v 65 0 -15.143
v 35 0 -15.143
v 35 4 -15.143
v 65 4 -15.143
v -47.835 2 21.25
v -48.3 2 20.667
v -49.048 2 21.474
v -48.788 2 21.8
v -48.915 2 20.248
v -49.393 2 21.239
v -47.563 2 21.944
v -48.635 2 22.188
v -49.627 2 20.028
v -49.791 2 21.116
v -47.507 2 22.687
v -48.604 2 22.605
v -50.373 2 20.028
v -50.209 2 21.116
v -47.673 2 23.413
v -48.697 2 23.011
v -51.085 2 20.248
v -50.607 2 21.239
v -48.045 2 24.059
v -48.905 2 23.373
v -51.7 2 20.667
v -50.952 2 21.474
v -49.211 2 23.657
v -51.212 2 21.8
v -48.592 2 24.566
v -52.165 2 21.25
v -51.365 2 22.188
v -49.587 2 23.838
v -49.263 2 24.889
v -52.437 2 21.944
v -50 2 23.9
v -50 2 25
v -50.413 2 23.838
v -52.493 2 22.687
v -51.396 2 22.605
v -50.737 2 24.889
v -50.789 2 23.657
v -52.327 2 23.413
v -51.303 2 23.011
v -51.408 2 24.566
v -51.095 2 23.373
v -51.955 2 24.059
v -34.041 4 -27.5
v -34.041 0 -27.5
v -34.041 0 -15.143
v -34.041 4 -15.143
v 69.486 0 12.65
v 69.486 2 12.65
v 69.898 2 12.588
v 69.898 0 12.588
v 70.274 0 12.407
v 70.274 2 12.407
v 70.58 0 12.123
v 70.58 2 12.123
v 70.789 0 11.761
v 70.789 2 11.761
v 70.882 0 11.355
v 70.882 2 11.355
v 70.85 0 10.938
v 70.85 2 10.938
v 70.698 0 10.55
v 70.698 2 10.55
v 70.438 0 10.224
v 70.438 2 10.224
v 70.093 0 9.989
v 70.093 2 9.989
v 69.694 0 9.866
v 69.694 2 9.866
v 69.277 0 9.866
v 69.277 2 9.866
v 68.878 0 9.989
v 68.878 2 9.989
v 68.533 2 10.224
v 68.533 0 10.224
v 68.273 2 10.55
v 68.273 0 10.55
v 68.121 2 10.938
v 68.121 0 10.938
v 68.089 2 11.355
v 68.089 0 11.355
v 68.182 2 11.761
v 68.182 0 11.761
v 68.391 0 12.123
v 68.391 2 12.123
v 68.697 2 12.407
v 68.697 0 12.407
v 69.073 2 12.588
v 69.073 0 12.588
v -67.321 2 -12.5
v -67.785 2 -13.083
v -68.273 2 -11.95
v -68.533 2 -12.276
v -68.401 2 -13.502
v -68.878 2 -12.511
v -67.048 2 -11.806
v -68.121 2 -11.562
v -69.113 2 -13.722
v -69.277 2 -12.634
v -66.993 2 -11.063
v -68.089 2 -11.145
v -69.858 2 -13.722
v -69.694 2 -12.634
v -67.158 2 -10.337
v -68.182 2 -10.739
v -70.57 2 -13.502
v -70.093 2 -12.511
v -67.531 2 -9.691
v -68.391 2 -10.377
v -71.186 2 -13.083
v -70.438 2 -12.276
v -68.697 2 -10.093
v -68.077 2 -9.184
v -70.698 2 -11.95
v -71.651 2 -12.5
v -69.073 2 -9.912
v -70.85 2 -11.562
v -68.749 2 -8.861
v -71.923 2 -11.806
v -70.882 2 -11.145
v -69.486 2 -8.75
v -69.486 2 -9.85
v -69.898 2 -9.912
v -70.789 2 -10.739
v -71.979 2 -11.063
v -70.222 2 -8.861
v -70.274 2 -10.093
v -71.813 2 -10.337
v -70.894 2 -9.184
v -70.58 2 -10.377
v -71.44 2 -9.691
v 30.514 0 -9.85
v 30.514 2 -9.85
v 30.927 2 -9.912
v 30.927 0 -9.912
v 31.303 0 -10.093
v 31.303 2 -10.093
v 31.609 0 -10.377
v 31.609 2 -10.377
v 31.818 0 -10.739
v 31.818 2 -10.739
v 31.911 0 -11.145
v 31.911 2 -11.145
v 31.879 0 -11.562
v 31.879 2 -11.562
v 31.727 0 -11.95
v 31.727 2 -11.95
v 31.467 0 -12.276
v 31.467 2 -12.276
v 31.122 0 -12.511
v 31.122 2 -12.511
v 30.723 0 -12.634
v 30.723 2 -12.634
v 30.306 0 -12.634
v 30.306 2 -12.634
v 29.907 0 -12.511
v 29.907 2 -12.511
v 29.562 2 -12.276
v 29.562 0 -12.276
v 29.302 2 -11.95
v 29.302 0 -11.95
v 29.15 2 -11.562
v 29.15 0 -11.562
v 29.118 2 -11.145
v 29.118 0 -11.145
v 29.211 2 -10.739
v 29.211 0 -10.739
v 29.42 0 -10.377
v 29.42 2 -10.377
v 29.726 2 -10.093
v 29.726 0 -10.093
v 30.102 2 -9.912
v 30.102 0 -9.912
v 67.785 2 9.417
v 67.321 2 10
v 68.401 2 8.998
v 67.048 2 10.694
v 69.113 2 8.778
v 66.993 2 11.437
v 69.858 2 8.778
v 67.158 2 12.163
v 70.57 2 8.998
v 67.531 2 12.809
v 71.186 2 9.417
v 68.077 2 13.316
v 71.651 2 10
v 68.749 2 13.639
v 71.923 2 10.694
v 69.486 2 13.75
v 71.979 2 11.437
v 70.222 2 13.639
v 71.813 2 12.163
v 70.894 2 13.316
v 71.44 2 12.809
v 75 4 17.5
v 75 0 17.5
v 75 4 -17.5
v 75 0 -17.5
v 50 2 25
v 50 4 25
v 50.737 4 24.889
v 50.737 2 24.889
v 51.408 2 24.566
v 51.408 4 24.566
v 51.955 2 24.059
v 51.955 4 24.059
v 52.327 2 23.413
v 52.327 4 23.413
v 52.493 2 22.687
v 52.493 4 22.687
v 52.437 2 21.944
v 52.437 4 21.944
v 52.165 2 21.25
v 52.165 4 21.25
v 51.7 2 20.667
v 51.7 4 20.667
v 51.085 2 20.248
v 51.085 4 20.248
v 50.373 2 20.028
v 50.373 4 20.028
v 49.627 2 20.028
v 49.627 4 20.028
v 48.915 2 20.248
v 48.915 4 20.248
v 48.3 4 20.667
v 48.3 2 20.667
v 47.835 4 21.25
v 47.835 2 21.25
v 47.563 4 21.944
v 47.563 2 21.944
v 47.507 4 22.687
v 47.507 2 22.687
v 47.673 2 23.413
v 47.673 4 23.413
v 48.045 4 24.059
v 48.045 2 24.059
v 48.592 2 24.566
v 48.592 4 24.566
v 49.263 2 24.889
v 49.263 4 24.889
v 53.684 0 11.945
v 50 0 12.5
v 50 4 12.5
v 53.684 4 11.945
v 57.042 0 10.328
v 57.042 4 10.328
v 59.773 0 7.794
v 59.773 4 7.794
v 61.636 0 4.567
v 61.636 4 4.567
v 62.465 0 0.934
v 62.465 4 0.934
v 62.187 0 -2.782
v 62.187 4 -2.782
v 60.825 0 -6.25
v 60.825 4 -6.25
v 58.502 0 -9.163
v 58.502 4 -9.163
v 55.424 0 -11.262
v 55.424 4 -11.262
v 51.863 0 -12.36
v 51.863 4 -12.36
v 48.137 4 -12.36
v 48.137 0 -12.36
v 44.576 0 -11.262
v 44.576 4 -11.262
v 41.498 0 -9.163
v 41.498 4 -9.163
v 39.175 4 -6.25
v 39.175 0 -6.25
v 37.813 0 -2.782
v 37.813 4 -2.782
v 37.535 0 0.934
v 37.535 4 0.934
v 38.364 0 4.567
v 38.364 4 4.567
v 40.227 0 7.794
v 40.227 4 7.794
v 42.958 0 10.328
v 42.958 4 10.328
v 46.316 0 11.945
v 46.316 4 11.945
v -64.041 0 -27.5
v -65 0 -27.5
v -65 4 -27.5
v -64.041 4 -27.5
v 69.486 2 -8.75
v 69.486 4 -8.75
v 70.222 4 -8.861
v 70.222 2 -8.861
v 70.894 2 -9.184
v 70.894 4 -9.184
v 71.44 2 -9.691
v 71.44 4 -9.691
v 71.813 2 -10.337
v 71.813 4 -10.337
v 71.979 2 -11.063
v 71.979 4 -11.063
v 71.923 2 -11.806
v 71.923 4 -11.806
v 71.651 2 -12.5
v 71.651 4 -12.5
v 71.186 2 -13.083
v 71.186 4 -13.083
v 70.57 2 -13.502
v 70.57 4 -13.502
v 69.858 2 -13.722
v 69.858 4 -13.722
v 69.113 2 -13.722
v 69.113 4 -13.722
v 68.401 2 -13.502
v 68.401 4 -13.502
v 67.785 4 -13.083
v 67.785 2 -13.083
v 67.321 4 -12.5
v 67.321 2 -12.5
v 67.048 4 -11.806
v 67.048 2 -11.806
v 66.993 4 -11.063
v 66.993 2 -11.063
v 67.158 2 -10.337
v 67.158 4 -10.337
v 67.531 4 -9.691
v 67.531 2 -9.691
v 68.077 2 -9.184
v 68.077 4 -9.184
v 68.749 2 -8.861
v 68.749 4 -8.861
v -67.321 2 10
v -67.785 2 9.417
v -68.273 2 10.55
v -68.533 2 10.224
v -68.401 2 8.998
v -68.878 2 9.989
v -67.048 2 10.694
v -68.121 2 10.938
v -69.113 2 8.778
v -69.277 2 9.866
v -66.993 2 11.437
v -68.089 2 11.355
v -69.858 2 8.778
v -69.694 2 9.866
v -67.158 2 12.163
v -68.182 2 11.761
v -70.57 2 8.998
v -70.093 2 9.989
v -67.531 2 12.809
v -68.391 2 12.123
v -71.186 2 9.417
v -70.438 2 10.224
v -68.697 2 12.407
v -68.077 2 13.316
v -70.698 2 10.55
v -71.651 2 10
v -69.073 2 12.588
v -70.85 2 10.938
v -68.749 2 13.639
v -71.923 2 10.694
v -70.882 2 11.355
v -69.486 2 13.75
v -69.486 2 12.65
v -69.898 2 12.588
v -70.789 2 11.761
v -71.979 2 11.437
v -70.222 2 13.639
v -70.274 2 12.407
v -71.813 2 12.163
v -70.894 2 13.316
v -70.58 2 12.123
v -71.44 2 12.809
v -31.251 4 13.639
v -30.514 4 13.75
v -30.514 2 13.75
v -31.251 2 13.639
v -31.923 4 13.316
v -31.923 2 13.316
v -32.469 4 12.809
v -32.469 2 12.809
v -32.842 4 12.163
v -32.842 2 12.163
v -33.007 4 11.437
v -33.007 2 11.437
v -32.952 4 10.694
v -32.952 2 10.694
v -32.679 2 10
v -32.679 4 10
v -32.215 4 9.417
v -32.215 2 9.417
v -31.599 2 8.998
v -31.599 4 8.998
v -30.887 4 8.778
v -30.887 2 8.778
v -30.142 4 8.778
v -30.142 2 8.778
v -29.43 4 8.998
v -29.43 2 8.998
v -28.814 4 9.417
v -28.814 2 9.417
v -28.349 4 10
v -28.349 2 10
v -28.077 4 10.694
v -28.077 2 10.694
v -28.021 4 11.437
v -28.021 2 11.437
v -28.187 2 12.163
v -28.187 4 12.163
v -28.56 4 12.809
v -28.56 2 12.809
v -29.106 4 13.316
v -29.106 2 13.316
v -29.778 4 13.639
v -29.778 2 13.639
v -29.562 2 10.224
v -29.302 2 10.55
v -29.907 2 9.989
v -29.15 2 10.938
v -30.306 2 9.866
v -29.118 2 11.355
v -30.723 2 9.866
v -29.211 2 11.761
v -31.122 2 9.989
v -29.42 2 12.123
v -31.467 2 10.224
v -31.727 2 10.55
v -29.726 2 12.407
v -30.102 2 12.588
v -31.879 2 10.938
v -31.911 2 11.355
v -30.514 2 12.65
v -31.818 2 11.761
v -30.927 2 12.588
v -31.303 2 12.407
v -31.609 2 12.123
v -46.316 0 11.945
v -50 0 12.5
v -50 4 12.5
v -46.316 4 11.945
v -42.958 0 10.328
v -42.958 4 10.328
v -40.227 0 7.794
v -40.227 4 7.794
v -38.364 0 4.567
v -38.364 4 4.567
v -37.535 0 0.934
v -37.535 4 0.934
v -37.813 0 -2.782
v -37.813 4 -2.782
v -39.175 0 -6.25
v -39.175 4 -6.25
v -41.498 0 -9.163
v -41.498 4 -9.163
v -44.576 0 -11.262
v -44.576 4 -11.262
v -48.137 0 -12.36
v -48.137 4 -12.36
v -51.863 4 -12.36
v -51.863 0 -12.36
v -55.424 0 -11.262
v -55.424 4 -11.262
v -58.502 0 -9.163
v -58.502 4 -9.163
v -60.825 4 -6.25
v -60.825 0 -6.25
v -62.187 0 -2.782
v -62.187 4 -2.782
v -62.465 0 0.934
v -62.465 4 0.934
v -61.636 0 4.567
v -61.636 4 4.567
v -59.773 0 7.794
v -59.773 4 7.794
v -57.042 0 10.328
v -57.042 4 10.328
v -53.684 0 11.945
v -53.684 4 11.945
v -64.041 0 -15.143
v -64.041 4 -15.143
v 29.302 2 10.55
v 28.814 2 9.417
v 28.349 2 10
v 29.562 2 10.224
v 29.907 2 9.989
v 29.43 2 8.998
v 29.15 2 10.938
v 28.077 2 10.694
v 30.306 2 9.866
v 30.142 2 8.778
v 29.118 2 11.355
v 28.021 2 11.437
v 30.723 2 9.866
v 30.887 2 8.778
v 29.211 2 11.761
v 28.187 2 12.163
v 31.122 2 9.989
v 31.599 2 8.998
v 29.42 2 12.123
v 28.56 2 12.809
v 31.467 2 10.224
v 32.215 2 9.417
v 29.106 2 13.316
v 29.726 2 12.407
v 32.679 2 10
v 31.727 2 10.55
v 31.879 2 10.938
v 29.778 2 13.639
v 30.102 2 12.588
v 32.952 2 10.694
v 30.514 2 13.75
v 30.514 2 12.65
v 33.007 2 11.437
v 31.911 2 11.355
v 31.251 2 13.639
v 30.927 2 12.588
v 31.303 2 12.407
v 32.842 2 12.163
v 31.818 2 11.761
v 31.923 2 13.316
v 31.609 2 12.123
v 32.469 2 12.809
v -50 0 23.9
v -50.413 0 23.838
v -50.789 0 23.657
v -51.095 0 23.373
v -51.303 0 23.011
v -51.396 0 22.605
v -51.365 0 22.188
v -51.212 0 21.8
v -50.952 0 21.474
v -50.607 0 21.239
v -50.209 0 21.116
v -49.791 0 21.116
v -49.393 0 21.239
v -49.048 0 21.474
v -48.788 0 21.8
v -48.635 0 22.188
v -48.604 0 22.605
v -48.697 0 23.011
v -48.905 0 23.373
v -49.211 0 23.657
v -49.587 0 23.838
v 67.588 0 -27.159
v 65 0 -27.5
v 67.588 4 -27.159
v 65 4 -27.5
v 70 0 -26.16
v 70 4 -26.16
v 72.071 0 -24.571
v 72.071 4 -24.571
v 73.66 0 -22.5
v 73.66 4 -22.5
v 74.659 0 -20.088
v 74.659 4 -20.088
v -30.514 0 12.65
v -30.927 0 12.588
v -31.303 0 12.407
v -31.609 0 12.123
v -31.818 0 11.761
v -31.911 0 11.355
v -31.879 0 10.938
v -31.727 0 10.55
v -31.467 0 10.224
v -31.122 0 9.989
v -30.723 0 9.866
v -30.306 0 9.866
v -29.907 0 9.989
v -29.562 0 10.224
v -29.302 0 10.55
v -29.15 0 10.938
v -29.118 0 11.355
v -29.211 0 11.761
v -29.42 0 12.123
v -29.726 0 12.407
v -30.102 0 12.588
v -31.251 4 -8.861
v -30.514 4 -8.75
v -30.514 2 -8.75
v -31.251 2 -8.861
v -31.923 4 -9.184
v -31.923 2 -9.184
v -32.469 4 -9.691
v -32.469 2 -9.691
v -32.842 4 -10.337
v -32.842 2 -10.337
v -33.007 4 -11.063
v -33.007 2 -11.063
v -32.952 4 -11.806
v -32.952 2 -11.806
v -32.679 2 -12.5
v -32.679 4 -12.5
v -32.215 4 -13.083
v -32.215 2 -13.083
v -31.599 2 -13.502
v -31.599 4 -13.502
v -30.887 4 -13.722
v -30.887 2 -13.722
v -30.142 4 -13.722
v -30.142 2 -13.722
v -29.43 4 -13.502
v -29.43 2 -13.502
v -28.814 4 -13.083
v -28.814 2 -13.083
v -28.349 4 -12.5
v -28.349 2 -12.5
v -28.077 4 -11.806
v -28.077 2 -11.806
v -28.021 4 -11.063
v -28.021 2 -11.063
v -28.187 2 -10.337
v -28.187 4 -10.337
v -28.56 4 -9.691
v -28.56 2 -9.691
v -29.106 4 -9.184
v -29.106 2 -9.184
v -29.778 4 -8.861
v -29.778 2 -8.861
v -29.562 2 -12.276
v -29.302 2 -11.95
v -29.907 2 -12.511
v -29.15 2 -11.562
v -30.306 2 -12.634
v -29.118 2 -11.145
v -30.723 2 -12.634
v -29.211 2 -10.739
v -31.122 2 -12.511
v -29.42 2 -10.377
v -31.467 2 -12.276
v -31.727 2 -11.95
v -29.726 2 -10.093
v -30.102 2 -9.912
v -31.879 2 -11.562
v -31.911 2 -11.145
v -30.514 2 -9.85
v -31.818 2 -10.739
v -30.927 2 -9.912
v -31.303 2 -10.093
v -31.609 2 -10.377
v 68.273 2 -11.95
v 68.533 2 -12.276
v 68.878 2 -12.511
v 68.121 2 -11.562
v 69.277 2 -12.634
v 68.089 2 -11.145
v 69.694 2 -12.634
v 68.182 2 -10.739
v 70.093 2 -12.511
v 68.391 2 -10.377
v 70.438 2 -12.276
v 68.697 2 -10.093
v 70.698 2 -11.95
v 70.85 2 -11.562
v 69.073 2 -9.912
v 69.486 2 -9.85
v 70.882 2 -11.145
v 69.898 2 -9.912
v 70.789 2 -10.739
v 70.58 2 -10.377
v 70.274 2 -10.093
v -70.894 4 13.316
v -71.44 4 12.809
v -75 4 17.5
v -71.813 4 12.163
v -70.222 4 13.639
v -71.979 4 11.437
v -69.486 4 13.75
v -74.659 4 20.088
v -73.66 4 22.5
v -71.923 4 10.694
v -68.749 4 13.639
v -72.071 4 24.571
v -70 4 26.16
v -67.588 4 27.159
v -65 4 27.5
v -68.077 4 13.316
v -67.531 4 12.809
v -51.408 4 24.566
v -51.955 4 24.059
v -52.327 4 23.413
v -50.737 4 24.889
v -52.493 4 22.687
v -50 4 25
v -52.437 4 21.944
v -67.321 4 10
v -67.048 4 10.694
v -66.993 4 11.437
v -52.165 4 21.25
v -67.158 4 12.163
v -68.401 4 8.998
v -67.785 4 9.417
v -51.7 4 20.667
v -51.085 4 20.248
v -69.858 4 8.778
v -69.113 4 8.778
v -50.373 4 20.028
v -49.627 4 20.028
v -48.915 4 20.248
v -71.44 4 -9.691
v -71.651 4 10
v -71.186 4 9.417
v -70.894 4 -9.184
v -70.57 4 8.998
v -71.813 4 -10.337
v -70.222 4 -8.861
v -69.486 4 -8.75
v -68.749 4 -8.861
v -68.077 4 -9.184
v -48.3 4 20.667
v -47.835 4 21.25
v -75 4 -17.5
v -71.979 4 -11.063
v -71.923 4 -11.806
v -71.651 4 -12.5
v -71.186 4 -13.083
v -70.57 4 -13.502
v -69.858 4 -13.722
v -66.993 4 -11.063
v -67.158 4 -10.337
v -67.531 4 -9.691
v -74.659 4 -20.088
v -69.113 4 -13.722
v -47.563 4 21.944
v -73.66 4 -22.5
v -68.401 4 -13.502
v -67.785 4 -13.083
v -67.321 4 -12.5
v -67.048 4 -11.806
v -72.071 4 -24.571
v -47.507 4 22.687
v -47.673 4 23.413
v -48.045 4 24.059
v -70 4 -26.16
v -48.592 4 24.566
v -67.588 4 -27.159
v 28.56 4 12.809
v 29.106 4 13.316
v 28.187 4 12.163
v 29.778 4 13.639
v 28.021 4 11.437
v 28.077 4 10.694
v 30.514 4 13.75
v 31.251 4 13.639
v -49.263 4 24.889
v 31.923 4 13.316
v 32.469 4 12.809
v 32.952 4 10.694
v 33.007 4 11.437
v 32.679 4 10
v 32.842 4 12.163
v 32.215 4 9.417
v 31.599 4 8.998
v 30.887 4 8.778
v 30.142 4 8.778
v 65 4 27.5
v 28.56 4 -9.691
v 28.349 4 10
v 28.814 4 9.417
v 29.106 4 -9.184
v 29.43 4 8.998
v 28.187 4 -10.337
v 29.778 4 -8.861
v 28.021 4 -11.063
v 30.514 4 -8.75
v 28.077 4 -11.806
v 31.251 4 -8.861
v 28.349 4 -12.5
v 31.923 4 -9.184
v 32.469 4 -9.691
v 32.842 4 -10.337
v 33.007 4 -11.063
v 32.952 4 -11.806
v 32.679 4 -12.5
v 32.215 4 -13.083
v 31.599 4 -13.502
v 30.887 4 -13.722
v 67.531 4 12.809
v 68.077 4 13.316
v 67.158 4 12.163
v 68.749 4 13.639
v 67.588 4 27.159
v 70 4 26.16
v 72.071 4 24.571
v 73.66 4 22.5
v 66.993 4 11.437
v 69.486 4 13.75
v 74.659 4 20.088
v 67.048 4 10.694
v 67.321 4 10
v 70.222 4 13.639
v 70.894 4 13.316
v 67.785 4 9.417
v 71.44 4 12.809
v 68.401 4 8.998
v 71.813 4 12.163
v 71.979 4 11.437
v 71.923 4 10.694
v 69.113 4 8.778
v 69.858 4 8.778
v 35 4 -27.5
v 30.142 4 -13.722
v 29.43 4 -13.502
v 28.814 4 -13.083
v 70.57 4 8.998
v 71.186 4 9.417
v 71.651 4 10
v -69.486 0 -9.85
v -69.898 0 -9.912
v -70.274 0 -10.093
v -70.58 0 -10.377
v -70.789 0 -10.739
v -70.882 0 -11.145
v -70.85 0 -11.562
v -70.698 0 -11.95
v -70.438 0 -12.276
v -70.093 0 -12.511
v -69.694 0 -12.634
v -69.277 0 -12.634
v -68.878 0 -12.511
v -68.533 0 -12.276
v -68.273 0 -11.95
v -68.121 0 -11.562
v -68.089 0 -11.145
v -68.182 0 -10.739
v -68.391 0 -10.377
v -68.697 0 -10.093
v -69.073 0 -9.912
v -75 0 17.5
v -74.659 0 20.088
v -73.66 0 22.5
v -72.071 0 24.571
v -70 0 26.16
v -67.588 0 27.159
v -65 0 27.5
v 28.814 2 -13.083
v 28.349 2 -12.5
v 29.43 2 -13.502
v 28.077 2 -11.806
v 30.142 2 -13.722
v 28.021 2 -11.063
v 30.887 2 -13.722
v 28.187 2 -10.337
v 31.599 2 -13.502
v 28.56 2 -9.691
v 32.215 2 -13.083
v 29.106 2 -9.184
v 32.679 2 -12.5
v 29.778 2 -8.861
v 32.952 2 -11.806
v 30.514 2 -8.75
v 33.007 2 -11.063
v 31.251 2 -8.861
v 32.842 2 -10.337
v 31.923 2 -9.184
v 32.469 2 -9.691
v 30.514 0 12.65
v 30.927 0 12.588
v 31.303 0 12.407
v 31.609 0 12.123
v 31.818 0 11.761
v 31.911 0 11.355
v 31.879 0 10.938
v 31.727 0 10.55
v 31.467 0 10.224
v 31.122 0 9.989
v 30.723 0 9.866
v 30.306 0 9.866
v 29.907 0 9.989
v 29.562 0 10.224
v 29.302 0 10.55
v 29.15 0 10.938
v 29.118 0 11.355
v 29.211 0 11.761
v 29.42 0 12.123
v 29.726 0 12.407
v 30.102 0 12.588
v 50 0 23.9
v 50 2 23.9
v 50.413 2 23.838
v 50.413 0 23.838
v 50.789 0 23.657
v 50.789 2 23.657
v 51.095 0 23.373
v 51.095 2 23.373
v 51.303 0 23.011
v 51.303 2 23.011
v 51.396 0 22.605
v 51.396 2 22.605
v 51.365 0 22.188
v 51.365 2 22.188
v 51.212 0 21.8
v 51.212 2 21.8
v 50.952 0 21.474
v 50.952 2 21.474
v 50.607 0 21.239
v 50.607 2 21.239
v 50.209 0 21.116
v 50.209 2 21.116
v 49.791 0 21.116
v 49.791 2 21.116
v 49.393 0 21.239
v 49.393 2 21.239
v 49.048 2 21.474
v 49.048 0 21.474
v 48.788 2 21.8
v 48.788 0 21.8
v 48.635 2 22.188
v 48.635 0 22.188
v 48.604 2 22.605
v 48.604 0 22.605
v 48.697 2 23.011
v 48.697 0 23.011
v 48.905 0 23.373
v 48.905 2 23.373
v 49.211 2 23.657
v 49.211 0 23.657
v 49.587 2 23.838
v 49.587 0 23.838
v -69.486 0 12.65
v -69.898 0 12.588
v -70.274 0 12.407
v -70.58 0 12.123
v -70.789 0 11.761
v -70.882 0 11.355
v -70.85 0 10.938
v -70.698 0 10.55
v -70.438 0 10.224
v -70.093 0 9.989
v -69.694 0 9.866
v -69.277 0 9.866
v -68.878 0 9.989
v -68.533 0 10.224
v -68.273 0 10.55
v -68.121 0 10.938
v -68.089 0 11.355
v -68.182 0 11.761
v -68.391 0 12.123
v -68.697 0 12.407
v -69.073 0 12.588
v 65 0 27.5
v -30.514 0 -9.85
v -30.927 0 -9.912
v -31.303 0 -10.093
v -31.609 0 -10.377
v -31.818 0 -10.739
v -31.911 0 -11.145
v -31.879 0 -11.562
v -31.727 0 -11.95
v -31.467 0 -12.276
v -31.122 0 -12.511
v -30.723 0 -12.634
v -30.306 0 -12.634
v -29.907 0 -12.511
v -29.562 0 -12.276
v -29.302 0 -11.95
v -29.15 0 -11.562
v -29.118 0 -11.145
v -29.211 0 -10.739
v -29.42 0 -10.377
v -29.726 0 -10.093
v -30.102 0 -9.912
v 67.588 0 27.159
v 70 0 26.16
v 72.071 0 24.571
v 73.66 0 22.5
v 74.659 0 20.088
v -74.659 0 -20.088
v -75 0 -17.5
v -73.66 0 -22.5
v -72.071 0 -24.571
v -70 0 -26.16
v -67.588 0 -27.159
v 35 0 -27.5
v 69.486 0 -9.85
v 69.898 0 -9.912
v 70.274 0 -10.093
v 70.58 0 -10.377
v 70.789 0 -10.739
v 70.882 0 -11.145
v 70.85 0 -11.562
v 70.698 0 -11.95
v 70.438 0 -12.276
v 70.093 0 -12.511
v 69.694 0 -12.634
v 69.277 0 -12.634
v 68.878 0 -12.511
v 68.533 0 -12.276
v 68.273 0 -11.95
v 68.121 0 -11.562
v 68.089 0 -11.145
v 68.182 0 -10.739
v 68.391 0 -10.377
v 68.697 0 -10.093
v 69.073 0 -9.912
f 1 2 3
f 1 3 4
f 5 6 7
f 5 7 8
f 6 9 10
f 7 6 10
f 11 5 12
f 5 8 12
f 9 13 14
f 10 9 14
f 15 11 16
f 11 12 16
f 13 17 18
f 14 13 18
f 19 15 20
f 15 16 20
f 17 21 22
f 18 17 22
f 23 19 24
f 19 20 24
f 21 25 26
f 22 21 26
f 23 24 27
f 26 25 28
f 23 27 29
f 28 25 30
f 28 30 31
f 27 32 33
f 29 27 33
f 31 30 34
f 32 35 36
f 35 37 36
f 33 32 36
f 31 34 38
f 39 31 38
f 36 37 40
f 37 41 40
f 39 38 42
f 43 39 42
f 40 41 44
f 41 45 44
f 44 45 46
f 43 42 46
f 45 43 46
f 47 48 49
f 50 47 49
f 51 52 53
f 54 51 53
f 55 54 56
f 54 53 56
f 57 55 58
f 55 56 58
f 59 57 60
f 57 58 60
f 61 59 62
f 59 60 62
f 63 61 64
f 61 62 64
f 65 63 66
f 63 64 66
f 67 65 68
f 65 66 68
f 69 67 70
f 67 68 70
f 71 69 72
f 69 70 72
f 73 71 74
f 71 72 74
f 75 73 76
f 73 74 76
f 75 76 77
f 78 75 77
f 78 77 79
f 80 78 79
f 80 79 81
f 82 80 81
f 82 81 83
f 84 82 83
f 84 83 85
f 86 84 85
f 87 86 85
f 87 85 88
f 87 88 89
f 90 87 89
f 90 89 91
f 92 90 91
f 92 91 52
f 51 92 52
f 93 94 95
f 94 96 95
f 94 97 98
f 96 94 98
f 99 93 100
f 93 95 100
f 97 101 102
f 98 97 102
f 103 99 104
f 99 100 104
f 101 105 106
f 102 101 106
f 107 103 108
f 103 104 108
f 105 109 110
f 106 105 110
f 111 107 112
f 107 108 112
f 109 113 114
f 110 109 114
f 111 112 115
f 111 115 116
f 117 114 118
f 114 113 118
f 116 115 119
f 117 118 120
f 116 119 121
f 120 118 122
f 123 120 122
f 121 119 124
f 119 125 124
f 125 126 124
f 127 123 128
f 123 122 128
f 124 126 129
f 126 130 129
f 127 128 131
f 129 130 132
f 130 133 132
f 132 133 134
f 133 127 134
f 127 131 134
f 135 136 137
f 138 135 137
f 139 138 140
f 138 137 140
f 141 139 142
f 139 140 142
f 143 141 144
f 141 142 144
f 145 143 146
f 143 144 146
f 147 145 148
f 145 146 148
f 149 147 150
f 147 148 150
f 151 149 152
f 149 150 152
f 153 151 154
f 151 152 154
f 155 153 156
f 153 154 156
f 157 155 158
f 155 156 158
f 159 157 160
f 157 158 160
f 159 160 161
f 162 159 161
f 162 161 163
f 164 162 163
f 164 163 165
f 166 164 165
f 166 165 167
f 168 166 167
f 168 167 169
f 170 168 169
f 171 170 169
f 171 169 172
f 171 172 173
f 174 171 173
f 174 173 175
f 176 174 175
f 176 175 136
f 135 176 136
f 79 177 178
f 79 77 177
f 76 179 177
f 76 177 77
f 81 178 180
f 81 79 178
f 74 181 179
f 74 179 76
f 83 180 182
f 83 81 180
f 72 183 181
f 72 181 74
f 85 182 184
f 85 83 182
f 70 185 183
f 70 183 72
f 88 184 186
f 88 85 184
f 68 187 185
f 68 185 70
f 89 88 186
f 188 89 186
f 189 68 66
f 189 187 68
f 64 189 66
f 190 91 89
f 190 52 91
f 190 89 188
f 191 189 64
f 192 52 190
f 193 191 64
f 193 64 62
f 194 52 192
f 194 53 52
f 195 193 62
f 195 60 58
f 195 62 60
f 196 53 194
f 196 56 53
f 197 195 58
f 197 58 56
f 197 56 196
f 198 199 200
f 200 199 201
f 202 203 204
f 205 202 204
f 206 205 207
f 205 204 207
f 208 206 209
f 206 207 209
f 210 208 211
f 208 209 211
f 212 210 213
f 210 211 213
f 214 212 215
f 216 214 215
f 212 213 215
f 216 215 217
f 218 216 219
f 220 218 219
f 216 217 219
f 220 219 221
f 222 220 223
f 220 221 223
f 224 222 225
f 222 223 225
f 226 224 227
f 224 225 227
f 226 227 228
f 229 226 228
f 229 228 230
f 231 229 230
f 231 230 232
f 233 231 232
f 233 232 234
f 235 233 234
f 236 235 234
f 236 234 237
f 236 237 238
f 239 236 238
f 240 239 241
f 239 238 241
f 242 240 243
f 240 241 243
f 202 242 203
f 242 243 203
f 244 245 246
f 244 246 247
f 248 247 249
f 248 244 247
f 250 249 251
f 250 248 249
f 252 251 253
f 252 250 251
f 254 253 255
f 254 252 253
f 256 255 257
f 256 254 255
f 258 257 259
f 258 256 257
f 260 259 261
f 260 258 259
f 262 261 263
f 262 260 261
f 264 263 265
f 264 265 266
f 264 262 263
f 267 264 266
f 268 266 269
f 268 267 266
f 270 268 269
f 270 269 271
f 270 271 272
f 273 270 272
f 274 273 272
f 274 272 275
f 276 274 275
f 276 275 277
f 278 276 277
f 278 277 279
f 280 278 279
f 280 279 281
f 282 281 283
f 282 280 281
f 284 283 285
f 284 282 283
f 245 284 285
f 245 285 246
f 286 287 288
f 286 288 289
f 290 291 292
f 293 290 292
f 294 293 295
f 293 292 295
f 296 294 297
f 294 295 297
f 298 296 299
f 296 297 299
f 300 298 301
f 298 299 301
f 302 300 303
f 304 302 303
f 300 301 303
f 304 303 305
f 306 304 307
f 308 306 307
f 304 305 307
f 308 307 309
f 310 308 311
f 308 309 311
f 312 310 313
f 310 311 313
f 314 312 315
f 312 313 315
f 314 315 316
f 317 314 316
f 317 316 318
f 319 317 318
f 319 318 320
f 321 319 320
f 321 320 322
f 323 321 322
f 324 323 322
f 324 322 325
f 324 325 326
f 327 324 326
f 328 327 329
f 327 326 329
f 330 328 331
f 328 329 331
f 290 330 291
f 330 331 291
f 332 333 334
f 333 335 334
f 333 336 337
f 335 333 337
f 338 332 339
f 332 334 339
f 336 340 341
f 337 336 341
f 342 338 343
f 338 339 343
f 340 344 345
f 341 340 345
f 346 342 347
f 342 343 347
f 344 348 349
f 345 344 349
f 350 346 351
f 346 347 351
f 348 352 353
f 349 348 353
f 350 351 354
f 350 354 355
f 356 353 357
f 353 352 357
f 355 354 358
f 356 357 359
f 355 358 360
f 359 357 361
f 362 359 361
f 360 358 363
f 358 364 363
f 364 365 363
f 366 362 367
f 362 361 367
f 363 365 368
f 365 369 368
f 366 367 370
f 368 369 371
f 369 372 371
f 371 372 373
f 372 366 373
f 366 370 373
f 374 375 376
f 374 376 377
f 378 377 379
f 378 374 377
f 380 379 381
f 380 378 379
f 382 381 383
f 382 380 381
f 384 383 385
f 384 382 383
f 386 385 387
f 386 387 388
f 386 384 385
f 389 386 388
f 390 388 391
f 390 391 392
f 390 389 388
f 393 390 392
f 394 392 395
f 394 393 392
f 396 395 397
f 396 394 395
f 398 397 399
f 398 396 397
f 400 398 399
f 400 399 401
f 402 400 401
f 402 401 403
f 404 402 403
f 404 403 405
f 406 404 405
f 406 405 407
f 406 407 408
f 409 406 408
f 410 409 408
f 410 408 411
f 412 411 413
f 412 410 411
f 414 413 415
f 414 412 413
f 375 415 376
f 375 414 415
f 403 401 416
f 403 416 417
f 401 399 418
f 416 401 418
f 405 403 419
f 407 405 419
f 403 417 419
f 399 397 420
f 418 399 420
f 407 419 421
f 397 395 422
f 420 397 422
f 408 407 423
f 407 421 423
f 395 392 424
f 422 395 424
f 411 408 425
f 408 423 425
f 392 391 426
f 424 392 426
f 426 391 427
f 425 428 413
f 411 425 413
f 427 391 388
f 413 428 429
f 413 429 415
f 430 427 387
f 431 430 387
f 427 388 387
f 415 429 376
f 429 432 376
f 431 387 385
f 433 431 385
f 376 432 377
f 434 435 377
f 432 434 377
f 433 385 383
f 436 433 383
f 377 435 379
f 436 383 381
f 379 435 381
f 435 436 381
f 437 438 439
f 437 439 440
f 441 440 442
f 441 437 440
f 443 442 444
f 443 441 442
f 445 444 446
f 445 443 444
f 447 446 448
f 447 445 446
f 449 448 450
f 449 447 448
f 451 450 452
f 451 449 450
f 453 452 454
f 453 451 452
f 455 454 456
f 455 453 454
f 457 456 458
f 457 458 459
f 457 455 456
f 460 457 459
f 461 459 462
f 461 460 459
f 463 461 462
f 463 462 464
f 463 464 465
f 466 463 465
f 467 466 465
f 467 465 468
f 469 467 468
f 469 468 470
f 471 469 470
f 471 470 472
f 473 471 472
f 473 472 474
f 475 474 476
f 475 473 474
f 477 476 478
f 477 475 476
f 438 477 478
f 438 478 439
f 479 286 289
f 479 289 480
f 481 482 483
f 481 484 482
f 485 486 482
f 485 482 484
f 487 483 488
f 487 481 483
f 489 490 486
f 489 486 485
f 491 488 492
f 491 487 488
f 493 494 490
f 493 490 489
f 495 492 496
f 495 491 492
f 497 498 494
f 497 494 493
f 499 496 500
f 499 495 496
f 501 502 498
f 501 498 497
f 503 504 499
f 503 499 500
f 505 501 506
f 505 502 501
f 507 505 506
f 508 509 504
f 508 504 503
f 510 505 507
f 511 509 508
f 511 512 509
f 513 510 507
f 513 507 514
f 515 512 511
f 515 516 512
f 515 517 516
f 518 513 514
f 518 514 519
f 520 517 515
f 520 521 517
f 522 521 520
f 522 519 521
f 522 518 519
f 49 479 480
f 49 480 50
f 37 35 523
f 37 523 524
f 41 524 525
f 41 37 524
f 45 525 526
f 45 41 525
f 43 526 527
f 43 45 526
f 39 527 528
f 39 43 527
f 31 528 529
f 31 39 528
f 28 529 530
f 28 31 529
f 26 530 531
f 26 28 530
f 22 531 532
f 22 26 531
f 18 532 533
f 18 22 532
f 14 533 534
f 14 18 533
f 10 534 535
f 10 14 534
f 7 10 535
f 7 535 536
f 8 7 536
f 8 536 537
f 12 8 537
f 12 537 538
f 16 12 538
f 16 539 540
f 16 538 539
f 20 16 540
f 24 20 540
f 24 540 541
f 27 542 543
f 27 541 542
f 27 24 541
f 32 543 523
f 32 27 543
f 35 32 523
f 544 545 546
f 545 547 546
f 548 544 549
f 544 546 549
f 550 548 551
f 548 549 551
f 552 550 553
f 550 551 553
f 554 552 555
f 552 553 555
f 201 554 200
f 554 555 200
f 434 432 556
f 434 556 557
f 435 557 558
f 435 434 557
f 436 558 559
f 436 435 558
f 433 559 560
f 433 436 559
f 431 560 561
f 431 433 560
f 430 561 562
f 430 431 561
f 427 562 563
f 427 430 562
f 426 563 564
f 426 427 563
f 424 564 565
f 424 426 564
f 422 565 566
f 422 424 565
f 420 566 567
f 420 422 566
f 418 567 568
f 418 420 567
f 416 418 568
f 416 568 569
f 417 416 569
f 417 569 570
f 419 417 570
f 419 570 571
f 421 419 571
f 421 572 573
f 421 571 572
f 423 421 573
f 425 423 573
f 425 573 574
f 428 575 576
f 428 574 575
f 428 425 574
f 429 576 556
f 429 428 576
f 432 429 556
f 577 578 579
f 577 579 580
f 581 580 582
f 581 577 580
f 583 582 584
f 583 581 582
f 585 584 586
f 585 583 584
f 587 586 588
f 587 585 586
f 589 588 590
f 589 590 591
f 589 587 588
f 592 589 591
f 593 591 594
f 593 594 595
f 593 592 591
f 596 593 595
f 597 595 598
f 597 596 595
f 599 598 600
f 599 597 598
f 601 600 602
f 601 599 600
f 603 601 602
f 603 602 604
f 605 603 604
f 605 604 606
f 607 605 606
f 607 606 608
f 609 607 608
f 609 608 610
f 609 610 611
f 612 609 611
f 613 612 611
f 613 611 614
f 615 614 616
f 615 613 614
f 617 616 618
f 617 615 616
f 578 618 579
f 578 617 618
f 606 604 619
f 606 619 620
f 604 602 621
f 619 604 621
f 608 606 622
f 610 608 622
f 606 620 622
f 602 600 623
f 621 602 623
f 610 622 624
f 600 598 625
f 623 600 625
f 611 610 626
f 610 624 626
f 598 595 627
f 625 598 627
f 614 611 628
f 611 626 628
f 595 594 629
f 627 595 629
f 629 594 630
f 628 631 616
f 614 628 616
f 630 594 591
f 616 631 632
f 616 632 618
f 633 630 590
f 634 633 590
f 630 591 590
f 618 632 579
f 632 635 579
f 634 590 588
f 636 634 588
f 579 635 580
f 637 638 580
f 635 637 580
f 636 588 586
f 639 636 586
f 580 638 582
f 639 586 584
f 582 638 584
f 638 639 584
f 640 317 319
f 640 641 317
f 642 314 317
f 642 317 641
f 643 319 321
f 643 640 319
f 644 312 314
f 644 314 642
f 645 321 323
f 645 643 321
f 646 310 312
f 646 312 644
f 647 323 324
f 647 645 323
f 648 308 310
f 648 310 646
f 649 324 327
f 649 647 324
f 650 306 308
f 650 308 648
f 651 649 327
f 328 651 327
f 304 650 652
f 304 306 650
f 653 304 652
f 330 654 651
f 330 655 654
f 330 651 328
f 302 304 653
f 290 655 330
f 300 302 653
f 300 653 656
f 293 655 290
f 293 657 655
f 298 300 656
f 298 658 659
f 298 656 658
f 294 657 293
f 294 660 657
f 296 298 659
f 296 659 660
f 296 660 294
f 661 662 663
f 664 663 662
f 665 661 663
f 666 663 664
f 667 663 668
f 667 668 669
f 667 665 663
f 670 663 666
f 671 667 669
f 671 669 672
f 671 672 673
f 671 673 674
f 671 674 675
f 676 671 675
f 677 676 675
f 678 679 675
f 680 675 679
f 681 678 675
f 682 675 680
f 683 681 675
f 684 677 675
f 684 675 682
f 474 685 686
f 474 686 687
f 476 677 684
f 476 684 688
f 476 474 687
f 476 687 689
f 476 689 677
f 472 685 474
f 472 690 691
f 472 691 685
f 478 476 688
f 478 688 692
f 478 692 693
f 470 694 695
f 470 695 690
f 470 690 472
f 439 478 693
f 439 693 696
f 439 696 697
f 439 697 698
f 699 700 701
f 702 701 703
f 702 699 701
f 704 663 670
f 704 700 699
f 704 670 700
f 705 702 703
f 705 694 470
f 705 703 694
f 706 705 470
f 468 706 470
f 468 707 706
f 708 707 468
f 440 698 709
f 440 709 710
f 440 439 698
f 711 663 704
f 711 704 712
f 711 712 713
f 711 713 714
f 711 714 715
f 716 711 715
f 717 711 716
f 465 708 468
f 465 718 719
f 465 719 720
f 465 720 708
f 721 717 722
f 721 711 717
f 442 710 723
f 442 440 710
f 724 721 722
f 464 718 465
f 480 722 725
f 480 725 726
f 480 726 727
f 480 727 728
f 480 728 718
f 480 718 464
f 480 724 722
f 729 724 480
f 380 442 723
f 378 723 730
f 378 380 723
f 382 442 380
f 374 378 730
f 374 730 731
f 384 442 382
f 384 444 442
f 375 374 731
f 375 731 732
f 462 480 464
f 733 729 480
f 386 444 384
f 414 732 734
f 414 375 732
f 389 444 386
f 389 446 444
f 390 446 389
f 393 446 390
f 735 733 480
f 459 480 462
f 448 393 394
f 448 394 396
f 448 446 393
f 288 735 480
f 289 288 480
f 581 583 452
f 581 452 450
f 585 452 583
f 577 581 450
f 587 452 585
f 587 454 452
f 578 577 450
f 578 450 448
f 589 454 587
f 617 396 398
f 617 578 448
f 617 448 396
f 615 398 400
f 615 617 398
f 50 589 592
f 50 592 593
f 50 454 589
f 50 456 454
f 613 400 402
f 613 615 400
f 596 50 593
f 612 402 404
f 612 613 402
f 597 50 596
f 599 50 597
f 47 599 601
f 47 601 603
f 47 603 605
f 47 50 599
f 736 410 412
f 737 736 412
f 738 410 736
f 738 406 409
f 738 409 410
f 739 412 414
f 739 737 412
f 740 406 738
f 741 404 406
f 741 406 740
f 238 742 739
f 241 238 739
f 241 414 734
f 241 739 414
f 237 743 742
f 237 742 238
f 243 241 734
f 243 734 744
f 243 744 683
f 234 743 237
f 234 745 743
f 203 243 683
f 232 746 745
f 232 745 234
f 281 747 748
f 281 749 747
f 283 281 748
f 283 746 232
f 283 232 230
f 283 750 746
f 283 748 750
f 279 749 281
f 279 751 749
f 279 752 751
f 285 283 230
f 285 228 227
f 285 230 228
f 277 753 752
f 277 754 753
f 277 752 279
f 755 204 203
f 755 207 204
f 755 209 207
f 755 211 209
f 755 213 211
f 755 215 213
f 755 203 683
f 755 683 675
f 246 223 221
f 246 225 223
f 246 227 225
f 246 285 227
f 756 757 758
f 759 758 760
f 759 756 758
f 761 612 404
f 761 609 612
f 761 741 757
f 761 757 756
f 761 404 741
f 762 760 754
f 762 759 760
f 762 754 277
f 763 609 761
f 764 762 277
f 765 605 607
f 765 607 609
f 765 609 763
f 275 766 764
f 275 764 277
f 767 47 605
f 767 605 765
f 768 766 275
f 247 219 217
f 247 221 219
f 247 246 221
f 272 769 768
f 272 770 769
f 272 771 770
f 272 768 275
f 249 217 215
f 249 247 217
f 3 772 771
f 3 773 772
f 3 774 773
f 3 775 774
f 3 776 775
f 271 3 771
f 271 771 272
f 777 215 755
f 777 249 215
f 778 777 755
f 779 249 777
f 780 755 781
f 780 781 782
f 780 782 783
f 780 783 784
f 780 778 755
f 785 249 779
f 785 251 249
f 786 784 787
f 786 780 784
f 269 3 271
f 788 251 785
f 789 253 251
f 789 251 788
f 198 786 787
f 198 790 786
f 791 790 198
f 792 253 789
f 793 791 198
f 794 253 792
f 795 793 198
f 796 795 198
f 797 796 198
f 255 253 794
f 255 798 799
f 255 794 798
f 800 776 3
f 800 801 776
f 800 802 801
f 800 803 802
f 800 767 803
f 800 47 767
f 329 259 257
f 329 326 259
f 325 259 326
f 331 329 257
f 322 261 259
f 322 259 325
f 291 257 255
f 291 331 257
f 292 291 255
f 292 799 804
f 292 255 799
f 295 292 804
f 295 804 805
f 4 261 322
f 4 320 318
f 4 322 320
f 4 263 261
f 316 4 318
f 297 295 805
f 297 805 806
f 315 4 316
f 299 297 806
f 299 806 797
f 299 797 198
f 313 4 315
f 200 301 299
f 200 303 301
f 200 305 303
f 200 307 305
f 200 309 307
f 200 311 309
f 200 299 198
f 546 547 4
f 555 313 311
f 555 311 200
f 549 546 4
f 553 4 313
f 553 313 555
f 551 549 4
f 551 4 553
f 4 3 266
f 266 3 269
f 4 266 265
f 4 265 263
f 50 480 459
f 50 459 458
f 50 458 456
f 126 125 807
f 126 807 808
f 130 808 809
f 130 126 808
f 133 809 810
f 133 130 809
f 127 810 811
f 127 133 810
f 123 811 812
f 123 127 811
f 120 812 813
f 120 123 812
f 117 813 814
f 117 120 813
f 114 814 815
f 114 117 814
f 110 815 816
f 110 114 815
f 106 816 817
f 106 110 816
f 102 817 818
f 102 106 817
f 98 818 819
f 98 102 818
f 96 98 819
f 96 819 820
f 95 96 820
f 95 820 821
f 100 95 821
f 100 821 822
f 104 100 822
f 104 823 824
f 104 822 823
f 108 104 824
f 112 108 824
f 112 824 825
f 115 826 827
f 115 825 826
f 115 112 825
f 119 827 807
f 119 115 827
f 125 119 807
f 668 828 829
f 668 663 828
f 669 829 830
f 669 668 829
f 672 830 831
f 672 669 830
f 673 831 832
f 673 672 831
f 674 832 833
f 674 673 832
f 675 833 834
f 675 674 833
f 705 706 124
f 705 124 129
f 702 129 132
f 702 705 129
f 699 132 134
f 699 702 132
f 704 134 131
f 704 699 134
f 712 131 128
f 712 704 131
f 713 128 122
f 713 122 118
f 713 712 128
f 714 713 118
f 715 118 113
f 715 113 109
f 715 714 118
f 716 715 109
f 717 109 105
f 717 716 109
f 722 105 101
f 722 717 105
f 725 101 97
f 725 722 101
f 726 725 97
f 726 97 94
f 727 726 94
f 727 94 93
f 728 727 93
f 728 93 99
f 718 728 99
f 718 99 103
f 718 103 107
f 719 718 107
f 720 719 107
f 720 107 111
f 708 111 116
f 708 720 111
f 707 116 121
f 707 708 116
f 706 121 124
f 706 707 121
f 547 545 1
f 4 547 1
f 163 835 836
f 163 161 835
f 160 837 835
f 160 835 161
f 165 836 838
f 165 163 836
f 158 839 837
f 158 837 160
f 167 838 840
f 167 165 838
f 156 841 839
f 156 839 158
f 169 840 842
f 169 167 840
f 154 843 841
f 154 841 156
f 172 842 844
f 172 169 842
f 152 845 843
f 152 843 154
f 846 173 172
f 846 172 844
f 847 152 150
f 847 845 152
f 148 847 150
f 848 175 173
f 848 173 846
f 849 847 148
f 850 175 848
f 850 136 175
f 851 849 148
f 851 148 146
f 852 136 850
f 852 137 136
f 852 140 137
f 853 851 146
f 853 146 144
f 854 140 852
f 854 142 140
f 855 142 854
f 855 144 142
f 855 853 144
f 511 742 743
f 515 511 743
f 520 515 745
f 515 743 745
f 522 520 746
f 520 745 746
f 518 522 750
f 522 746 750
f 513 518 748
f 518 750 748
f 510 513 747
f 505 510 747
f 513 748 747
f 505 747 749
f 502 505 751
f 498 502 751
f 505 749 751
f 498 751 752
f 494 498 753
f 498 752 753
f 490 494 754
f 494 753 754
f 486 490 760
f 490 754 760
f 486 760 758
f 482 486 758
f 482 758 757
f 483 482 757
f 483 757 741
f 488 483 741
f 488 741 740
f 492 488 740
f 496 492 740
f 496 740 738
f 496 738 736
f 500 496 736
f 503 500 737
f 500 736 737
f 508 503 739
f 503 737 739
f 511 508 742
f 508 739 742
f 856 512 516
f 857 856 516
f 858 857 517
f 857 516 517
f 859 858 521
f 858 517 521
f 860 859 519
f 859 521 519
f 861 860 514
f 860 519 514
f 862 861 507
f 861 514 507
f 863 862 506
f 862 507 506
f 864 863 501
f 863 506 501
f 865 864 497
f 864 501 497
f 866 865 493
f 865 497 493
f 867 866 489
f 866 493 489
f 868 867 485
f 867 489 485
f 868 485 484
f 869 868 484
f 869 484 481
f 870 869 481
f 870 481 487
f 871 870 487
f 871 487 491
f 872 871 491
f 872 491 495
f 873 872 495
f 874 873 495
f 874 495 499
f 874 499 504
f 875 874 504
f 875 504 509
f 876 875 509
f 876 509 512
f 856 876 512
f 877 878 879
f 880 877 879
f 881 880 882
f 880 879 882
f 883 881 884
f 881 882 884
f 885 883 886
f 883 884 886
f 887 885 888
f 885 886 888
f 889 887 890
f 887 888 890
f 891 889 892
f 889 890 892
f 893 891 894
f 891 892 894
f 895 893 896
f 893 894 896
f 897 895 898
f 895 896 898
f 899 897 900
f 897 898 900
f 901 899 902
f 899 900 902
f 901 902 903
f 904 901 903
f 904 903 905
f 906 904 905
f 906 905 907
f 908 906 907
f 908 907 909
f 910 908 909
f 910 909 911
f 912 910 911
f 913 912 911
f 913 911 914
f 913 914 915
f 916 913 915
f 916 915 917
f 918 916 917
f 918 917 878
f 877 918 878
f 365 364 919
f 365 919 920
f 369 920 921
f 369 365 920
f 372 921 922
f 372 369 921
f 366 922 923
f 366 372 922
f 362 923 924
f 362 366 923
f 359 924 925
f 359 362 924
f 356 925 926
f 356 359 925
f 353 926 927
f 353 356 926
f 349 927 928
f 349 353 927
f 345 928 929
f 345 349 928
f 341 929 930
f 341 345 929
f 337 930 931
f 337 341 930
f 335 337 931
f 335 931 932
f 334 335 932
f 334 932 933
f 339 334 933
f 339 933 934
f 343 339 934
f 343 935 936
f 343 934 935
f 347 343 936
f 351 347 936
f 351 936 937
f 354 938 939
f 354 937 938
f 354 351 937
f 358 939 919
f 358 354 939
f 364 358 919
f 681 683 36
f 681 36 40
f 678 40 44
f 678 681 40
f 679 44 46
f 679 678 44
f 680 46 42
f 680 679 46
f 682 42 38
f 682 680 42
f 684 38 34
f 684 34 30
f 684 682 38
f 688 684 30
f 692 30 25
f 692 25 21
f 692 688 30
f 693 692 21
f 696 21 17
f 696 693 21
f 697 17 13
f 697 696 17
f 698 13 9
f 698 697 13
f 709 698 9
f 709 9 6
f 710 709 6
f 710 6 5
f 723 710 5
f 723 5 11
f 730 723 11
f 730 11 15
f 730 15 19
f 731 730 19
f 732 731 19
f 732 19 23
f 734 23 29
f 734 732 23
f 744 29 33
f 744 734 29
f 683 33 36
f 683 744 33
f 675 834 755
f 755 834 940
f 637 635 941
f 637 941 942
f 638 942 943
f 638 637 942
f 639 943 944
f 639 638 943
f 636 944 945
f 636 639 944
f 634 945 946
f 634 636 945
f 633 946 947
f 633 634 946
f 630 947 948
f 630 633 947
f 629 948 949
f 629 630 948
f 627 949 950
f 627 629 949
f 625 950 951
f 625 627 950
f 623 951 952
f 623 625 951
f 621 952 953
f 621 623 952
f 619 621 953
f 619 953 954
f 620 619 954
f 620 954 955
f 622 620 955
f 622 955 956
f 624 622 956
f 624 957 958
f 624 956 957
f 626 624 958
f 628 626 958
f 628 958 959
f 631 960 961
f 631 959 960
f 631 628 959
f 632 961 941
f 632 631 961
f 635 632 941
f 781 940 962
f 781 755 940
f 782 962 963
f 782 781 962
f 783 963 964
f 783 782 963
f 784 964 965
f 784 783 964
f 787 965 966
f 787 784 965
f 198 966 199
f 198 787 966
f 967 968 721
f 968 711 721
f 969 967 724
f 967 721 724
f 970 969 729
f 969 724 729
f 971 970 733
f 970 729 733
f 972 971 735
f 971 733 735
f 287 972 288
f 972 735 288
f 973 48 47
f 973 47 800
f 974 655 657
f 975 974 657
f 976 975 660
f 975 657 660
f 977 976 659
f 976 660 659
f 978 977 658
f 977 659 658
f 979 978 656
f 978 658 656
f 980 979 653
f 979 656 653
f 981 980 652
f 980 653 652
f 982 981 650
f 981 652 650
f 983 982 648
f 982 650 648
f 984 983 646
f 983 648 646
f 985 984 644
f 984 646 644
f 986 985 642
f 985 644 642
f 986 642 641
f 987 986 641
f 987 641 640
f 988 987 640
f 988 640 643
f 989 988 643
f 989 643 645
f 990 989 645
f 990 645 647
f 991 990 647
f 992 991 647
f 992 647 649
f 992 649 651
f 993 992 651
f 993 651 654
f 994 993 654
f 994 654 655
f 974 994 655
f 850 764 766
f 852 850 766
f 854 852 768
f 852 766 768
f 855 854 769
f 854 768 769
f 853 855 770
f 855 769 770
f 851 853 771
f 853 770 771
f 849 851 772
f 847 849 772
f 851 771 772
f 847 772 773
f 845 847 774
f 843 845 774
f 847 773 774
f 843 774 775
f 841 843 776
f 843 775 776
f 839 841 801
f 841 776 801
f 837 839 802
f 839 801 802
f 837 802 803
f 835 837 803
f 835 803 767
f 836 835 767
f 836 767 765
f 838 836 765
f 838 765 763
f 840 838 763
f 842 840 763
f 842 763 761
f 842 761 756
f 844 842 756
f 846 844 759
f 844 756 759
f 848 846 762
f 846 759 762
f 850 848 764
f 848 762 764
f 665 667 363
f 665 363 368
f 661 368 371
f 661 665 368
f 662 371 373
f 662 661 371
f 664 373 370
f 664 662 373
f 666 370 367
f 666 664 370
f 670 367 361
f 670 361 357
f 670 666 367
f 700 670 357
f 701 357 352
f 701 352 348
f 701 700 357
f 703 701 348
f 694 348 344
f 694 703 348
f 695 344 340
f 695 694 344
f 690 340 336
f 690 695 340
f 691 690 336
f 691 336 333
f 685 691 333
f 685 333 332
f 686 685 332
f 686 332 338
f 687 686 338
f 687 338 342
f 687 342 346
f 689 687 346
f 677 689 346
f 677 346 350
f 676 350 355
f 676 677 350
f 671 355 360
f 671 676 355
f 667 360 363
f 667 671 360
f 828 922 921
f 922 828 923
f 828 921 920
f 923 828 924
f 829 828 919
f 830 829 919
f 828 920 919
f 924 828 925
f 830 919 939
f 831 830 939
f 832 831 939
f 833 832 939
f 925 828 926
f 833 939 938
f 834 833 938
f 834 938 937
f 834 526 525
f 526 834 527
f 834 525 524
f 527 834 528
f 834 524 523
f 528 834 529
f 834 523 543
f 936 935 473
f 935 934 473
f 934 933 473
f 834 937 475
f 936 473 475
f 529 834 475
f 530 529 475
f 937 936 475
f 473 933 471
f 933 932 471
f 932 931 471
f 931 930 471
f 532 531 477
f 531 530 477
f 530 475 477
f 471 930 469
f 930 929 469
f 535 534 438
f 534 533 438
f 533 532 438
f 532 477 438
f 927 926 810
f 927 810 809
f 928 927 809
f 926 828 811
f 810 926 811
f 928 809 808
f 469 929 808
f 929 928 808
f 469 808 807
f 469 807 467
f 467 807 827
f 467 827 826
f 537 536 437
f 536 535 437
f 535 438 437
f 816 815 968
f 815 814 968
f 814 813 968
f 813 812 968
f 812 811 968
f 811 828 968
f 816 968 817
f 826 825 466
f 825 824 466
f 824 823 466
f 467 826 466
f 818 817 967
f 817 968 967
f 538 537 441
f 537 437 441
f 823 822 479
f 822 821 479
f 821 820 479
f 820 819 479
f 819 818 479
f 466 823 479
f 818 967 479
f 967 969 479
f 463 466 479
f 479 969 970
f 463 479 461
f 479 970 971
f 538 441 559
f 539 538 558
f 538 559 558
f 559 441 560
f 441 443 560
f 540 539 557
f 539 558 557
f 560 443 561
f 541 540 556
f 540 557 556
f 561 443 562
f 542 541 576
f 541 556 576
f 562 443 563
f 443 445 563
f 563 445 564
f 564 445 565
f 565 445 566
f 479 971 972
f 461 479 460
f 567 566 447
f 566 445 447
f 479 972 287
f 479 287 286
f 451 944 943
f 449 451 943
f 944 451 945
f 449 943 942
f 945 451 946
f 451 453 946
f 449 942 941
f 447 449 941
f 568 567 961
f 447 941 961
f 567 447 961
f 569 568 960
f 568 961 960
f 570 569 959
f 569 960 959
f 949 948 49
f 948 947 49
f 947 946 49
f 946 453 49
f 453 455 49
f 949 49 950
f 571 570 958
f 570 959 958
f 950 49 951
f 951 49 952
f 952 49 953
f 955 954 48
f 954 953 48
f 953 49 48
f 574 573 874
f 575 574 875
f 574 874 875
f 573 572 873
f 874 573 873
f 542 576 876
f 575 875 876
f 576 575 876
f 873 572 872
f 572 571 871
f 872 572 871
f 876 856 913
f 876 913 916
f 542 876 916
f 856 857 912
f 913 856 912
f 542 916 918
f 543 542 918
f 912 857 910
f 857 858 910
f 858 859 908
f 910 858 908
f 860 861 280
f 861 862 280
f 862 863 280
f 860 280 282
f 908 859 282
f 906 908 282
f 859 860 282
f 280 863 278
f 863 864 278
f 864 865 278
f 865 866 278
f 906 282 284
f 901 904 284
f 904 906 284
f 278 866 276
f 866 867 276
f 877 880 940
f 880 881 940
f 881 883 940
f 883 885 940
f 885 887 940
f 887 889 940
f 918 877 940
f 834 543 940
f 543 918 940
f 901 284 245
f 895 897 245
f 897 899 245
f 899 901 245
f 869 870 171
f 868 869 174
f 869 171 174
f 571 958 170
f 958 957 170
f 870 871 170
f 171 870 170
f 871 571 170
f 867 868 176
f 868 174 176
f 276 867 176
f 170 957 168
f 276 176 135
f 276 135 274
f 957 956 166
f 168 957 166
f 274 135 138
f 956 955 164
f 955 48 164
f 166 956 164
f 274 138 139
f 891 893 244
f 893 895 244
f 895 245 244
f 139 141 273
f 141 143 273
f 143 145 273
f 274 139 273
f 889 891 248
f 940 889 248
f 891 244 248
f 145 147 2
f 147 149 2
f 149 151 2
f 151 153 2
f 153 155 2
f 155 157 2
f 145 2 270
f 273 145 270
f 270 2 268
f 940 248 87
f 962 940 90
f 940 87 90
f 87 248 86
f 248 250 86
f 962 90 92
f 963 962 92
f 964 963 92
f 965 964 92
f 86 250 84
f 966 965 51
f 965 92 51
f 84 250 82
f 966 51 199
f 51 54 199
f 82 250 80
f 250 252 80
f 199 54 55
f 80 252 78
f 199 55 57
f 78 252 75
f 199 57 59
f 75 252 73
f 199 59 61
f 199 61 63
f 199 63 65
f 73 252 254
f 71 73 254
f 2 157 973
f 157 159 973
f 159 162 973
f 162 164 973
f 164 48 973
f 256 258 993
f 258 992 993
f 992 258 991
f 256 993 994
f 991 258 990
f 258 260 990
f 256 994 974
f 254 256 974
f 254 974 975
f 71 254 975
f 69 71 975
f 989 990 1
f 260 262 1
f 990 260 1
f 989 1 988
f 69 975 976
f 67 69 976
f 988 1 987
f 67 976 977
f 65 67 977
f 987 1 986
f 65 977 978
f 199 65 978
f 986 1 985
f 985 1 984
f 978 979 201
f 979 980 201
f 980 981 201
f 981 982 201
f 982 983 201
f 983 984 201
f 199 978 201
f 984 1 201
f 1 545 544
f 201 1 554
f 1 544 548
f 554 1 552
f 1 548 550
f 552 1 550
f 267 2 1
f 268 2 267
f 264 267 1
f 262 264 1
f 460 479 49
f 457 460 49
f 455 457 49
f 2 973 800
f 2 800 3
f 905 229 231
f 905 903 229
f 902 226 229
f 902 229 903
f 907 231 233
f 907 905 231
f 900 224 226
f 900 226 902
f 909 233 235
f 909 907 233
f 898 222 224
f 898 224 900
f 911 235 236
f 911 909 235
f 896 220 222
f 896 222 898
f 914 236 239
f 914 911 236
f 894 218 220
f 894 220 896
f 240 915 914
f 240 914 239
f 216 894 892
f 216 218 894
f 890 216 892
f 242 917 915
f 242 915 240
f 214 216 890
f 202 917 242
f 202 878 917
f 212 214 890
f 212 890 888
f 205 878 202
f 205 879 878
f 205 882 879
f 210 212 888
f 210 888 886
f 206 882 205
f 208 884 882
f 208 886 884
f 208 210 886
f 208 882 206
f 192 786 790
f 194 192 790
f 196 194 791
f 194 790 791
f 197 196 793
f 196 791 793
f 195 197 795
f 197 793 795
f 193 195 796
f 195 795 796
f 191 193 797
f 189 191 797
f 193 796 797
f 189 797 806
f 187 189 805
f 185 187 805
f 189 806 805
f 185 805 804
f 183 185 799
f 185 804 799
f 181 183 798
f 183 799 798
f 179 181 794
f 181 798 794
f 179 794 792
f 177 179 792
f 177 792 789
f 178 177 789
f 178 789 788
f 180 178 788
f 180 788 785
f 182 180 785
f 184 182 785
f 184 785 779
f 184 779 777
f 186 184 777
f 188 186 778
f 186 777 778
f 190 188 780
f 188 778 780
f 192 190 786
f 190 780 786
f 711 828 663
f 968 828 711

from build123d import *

# Parameters (mm, degrees)
SKETCH1_W           = 150
SKETCH1_H           = 55
SKETCH1_R           = 12.5
BOSS_EXTRUDE1_DEPTH = 4
SKETCH2_R           = 1.4
CUT_EXTRUDE1_DEPTH  = 80.982810653
SKETCH3_R           = 2.5
CUT_EXTRUDE3_DEPTH  = 2
FILLET1_R           = 10
SKETCH4_W           = 30
SKETCH4_H           = 12.357308998
CUT_EXTRUDE4_DEPTH  = 80.982810653


with BuildPart() as part:
    # Sketch1 → Boss-Extrude1 (new body)
    with BuildSketch(Plane(origin=(0, 0, 0), x_dir=(1, 0, 0), z_dir=(0, 1, 0))):
        Rectangle(SKETCH1_W, SKETCH1_H)
        with Locations(Location((-50, 0, 0), (0, 0, 270))):
            Circle(SKETCH1_R, mode=Mode.SUBTRACT)
        with Locations(Location((50, 0, 0), (0, 0, 270))):
            Circle(SKETCH1_R, mode=Mode.SUBTRACT)
    extrude(amount=BOSS_EXTRUDE1_DEPTH)

    # Sketch2 → Cut-Extrude1 (cut, through all)
    with BuildSketch(Plane(origin=(0, 4, 0), x_dir=(1, 0, 0), z_dir=(0, 1, 0))):
        with Locations(Location((30.514428415, 11.25, 0), (0, 0, 270))):
            Circle(SKETCH2_R)
        with Locations(Location((69.485571585, 11.25, 0), (0, 0, 270))):
            Circle(SKETCH2_R)
        with Locations(Location((69.485571585, -11.25, 0), (0, 0, 270))):
            Circle(SKETCH2_R)
        with Locations(Location((30.514428415, -11.25, 0), (0, 0, 270))):
            Circle(SKETCH2_R)
        with Locations(Location((50, -22.5, 0), (0, 0, 270))):
            Circle(SKETCH2_R)
    cut_extrude1 = extrude(amount=-CUT_EXTRUDE1_DEPTH, mode=Mode.SUBTRACT)

    # Sketch3 → Cut-Extrude3 (cut)
    with BuildSketch(Plane(origin=(0, 4, 0), x_dir=(1, 0, 0), z_dir=(0, 1, 0))):
        with Locations(Location((30.514428415, 11.25, 0), (0, 0, 270))):
            Circle(SKETCH3_R)
        with Locations(Location((30.514428415, -11.25, 0), (0, 0, 270))):
            Circle(SKETCH3_R)
        with Locations(Location((50, -22.5, 0), (0, 0, 270))):
            Circle(SKETCH3_R)
        with Locations(Location((69.485571585, -11.25, 0), (0, 0, 270))):
            Circle(SKETCH3_R)
        with Locations(Location((69.485571585, 11.25, 0), (0, 0, 270))):
            Circle(SKETCH3_R)
    cut_extrude3 = extrude(amount=-CUT_EXTRUDE3_DEPTH, mode=Mode.SUBTRACT)

    # Mirror1: Cut-Extrude1, Cut-Extrude3 across plane
    add(cut_extrude1.mirror(Plane(origin=(0, 0, 0), x_dir=(0, 0, 1), z_dir=(1, 0, 0))), mode=Mode.SUBTRACT)
    add(cut_extrude3.mirror(Plane(origin=(0, 0, 0), x_dir=(0, 0, 1), z_dir=(1, 0, 0))), mode=Mode.SUBTRACT)

    # Fillet1
    fillet1_edges = [part.edges().sort_by_distance(p)[0] for p in [
        (-75, 2, -27.5),
        (75, 2, -27.5),
        (75, 2, 27.5),
        (-75, 2, 27.5),
    ]]
    fillet(fillet1_edges, radius=FILLET1_R)

    # Sketch4 → Cut-Extrude4 (cut, through all)
    with BuildSketch(Plane.XZ):
        with Locations((-49.04071088, -21.321345501)):
            Rectangle(SKETCH4_W, SKETCH4_H)
        with Locations((50, -21.321345501)):
            Rectangle(SKETCH4_W, SKETCH4_H)
    extrude(amount=-CUT_EXTRUDE4_DEPTH, mode=Mode.SUBTRACT)


solid = part.part
